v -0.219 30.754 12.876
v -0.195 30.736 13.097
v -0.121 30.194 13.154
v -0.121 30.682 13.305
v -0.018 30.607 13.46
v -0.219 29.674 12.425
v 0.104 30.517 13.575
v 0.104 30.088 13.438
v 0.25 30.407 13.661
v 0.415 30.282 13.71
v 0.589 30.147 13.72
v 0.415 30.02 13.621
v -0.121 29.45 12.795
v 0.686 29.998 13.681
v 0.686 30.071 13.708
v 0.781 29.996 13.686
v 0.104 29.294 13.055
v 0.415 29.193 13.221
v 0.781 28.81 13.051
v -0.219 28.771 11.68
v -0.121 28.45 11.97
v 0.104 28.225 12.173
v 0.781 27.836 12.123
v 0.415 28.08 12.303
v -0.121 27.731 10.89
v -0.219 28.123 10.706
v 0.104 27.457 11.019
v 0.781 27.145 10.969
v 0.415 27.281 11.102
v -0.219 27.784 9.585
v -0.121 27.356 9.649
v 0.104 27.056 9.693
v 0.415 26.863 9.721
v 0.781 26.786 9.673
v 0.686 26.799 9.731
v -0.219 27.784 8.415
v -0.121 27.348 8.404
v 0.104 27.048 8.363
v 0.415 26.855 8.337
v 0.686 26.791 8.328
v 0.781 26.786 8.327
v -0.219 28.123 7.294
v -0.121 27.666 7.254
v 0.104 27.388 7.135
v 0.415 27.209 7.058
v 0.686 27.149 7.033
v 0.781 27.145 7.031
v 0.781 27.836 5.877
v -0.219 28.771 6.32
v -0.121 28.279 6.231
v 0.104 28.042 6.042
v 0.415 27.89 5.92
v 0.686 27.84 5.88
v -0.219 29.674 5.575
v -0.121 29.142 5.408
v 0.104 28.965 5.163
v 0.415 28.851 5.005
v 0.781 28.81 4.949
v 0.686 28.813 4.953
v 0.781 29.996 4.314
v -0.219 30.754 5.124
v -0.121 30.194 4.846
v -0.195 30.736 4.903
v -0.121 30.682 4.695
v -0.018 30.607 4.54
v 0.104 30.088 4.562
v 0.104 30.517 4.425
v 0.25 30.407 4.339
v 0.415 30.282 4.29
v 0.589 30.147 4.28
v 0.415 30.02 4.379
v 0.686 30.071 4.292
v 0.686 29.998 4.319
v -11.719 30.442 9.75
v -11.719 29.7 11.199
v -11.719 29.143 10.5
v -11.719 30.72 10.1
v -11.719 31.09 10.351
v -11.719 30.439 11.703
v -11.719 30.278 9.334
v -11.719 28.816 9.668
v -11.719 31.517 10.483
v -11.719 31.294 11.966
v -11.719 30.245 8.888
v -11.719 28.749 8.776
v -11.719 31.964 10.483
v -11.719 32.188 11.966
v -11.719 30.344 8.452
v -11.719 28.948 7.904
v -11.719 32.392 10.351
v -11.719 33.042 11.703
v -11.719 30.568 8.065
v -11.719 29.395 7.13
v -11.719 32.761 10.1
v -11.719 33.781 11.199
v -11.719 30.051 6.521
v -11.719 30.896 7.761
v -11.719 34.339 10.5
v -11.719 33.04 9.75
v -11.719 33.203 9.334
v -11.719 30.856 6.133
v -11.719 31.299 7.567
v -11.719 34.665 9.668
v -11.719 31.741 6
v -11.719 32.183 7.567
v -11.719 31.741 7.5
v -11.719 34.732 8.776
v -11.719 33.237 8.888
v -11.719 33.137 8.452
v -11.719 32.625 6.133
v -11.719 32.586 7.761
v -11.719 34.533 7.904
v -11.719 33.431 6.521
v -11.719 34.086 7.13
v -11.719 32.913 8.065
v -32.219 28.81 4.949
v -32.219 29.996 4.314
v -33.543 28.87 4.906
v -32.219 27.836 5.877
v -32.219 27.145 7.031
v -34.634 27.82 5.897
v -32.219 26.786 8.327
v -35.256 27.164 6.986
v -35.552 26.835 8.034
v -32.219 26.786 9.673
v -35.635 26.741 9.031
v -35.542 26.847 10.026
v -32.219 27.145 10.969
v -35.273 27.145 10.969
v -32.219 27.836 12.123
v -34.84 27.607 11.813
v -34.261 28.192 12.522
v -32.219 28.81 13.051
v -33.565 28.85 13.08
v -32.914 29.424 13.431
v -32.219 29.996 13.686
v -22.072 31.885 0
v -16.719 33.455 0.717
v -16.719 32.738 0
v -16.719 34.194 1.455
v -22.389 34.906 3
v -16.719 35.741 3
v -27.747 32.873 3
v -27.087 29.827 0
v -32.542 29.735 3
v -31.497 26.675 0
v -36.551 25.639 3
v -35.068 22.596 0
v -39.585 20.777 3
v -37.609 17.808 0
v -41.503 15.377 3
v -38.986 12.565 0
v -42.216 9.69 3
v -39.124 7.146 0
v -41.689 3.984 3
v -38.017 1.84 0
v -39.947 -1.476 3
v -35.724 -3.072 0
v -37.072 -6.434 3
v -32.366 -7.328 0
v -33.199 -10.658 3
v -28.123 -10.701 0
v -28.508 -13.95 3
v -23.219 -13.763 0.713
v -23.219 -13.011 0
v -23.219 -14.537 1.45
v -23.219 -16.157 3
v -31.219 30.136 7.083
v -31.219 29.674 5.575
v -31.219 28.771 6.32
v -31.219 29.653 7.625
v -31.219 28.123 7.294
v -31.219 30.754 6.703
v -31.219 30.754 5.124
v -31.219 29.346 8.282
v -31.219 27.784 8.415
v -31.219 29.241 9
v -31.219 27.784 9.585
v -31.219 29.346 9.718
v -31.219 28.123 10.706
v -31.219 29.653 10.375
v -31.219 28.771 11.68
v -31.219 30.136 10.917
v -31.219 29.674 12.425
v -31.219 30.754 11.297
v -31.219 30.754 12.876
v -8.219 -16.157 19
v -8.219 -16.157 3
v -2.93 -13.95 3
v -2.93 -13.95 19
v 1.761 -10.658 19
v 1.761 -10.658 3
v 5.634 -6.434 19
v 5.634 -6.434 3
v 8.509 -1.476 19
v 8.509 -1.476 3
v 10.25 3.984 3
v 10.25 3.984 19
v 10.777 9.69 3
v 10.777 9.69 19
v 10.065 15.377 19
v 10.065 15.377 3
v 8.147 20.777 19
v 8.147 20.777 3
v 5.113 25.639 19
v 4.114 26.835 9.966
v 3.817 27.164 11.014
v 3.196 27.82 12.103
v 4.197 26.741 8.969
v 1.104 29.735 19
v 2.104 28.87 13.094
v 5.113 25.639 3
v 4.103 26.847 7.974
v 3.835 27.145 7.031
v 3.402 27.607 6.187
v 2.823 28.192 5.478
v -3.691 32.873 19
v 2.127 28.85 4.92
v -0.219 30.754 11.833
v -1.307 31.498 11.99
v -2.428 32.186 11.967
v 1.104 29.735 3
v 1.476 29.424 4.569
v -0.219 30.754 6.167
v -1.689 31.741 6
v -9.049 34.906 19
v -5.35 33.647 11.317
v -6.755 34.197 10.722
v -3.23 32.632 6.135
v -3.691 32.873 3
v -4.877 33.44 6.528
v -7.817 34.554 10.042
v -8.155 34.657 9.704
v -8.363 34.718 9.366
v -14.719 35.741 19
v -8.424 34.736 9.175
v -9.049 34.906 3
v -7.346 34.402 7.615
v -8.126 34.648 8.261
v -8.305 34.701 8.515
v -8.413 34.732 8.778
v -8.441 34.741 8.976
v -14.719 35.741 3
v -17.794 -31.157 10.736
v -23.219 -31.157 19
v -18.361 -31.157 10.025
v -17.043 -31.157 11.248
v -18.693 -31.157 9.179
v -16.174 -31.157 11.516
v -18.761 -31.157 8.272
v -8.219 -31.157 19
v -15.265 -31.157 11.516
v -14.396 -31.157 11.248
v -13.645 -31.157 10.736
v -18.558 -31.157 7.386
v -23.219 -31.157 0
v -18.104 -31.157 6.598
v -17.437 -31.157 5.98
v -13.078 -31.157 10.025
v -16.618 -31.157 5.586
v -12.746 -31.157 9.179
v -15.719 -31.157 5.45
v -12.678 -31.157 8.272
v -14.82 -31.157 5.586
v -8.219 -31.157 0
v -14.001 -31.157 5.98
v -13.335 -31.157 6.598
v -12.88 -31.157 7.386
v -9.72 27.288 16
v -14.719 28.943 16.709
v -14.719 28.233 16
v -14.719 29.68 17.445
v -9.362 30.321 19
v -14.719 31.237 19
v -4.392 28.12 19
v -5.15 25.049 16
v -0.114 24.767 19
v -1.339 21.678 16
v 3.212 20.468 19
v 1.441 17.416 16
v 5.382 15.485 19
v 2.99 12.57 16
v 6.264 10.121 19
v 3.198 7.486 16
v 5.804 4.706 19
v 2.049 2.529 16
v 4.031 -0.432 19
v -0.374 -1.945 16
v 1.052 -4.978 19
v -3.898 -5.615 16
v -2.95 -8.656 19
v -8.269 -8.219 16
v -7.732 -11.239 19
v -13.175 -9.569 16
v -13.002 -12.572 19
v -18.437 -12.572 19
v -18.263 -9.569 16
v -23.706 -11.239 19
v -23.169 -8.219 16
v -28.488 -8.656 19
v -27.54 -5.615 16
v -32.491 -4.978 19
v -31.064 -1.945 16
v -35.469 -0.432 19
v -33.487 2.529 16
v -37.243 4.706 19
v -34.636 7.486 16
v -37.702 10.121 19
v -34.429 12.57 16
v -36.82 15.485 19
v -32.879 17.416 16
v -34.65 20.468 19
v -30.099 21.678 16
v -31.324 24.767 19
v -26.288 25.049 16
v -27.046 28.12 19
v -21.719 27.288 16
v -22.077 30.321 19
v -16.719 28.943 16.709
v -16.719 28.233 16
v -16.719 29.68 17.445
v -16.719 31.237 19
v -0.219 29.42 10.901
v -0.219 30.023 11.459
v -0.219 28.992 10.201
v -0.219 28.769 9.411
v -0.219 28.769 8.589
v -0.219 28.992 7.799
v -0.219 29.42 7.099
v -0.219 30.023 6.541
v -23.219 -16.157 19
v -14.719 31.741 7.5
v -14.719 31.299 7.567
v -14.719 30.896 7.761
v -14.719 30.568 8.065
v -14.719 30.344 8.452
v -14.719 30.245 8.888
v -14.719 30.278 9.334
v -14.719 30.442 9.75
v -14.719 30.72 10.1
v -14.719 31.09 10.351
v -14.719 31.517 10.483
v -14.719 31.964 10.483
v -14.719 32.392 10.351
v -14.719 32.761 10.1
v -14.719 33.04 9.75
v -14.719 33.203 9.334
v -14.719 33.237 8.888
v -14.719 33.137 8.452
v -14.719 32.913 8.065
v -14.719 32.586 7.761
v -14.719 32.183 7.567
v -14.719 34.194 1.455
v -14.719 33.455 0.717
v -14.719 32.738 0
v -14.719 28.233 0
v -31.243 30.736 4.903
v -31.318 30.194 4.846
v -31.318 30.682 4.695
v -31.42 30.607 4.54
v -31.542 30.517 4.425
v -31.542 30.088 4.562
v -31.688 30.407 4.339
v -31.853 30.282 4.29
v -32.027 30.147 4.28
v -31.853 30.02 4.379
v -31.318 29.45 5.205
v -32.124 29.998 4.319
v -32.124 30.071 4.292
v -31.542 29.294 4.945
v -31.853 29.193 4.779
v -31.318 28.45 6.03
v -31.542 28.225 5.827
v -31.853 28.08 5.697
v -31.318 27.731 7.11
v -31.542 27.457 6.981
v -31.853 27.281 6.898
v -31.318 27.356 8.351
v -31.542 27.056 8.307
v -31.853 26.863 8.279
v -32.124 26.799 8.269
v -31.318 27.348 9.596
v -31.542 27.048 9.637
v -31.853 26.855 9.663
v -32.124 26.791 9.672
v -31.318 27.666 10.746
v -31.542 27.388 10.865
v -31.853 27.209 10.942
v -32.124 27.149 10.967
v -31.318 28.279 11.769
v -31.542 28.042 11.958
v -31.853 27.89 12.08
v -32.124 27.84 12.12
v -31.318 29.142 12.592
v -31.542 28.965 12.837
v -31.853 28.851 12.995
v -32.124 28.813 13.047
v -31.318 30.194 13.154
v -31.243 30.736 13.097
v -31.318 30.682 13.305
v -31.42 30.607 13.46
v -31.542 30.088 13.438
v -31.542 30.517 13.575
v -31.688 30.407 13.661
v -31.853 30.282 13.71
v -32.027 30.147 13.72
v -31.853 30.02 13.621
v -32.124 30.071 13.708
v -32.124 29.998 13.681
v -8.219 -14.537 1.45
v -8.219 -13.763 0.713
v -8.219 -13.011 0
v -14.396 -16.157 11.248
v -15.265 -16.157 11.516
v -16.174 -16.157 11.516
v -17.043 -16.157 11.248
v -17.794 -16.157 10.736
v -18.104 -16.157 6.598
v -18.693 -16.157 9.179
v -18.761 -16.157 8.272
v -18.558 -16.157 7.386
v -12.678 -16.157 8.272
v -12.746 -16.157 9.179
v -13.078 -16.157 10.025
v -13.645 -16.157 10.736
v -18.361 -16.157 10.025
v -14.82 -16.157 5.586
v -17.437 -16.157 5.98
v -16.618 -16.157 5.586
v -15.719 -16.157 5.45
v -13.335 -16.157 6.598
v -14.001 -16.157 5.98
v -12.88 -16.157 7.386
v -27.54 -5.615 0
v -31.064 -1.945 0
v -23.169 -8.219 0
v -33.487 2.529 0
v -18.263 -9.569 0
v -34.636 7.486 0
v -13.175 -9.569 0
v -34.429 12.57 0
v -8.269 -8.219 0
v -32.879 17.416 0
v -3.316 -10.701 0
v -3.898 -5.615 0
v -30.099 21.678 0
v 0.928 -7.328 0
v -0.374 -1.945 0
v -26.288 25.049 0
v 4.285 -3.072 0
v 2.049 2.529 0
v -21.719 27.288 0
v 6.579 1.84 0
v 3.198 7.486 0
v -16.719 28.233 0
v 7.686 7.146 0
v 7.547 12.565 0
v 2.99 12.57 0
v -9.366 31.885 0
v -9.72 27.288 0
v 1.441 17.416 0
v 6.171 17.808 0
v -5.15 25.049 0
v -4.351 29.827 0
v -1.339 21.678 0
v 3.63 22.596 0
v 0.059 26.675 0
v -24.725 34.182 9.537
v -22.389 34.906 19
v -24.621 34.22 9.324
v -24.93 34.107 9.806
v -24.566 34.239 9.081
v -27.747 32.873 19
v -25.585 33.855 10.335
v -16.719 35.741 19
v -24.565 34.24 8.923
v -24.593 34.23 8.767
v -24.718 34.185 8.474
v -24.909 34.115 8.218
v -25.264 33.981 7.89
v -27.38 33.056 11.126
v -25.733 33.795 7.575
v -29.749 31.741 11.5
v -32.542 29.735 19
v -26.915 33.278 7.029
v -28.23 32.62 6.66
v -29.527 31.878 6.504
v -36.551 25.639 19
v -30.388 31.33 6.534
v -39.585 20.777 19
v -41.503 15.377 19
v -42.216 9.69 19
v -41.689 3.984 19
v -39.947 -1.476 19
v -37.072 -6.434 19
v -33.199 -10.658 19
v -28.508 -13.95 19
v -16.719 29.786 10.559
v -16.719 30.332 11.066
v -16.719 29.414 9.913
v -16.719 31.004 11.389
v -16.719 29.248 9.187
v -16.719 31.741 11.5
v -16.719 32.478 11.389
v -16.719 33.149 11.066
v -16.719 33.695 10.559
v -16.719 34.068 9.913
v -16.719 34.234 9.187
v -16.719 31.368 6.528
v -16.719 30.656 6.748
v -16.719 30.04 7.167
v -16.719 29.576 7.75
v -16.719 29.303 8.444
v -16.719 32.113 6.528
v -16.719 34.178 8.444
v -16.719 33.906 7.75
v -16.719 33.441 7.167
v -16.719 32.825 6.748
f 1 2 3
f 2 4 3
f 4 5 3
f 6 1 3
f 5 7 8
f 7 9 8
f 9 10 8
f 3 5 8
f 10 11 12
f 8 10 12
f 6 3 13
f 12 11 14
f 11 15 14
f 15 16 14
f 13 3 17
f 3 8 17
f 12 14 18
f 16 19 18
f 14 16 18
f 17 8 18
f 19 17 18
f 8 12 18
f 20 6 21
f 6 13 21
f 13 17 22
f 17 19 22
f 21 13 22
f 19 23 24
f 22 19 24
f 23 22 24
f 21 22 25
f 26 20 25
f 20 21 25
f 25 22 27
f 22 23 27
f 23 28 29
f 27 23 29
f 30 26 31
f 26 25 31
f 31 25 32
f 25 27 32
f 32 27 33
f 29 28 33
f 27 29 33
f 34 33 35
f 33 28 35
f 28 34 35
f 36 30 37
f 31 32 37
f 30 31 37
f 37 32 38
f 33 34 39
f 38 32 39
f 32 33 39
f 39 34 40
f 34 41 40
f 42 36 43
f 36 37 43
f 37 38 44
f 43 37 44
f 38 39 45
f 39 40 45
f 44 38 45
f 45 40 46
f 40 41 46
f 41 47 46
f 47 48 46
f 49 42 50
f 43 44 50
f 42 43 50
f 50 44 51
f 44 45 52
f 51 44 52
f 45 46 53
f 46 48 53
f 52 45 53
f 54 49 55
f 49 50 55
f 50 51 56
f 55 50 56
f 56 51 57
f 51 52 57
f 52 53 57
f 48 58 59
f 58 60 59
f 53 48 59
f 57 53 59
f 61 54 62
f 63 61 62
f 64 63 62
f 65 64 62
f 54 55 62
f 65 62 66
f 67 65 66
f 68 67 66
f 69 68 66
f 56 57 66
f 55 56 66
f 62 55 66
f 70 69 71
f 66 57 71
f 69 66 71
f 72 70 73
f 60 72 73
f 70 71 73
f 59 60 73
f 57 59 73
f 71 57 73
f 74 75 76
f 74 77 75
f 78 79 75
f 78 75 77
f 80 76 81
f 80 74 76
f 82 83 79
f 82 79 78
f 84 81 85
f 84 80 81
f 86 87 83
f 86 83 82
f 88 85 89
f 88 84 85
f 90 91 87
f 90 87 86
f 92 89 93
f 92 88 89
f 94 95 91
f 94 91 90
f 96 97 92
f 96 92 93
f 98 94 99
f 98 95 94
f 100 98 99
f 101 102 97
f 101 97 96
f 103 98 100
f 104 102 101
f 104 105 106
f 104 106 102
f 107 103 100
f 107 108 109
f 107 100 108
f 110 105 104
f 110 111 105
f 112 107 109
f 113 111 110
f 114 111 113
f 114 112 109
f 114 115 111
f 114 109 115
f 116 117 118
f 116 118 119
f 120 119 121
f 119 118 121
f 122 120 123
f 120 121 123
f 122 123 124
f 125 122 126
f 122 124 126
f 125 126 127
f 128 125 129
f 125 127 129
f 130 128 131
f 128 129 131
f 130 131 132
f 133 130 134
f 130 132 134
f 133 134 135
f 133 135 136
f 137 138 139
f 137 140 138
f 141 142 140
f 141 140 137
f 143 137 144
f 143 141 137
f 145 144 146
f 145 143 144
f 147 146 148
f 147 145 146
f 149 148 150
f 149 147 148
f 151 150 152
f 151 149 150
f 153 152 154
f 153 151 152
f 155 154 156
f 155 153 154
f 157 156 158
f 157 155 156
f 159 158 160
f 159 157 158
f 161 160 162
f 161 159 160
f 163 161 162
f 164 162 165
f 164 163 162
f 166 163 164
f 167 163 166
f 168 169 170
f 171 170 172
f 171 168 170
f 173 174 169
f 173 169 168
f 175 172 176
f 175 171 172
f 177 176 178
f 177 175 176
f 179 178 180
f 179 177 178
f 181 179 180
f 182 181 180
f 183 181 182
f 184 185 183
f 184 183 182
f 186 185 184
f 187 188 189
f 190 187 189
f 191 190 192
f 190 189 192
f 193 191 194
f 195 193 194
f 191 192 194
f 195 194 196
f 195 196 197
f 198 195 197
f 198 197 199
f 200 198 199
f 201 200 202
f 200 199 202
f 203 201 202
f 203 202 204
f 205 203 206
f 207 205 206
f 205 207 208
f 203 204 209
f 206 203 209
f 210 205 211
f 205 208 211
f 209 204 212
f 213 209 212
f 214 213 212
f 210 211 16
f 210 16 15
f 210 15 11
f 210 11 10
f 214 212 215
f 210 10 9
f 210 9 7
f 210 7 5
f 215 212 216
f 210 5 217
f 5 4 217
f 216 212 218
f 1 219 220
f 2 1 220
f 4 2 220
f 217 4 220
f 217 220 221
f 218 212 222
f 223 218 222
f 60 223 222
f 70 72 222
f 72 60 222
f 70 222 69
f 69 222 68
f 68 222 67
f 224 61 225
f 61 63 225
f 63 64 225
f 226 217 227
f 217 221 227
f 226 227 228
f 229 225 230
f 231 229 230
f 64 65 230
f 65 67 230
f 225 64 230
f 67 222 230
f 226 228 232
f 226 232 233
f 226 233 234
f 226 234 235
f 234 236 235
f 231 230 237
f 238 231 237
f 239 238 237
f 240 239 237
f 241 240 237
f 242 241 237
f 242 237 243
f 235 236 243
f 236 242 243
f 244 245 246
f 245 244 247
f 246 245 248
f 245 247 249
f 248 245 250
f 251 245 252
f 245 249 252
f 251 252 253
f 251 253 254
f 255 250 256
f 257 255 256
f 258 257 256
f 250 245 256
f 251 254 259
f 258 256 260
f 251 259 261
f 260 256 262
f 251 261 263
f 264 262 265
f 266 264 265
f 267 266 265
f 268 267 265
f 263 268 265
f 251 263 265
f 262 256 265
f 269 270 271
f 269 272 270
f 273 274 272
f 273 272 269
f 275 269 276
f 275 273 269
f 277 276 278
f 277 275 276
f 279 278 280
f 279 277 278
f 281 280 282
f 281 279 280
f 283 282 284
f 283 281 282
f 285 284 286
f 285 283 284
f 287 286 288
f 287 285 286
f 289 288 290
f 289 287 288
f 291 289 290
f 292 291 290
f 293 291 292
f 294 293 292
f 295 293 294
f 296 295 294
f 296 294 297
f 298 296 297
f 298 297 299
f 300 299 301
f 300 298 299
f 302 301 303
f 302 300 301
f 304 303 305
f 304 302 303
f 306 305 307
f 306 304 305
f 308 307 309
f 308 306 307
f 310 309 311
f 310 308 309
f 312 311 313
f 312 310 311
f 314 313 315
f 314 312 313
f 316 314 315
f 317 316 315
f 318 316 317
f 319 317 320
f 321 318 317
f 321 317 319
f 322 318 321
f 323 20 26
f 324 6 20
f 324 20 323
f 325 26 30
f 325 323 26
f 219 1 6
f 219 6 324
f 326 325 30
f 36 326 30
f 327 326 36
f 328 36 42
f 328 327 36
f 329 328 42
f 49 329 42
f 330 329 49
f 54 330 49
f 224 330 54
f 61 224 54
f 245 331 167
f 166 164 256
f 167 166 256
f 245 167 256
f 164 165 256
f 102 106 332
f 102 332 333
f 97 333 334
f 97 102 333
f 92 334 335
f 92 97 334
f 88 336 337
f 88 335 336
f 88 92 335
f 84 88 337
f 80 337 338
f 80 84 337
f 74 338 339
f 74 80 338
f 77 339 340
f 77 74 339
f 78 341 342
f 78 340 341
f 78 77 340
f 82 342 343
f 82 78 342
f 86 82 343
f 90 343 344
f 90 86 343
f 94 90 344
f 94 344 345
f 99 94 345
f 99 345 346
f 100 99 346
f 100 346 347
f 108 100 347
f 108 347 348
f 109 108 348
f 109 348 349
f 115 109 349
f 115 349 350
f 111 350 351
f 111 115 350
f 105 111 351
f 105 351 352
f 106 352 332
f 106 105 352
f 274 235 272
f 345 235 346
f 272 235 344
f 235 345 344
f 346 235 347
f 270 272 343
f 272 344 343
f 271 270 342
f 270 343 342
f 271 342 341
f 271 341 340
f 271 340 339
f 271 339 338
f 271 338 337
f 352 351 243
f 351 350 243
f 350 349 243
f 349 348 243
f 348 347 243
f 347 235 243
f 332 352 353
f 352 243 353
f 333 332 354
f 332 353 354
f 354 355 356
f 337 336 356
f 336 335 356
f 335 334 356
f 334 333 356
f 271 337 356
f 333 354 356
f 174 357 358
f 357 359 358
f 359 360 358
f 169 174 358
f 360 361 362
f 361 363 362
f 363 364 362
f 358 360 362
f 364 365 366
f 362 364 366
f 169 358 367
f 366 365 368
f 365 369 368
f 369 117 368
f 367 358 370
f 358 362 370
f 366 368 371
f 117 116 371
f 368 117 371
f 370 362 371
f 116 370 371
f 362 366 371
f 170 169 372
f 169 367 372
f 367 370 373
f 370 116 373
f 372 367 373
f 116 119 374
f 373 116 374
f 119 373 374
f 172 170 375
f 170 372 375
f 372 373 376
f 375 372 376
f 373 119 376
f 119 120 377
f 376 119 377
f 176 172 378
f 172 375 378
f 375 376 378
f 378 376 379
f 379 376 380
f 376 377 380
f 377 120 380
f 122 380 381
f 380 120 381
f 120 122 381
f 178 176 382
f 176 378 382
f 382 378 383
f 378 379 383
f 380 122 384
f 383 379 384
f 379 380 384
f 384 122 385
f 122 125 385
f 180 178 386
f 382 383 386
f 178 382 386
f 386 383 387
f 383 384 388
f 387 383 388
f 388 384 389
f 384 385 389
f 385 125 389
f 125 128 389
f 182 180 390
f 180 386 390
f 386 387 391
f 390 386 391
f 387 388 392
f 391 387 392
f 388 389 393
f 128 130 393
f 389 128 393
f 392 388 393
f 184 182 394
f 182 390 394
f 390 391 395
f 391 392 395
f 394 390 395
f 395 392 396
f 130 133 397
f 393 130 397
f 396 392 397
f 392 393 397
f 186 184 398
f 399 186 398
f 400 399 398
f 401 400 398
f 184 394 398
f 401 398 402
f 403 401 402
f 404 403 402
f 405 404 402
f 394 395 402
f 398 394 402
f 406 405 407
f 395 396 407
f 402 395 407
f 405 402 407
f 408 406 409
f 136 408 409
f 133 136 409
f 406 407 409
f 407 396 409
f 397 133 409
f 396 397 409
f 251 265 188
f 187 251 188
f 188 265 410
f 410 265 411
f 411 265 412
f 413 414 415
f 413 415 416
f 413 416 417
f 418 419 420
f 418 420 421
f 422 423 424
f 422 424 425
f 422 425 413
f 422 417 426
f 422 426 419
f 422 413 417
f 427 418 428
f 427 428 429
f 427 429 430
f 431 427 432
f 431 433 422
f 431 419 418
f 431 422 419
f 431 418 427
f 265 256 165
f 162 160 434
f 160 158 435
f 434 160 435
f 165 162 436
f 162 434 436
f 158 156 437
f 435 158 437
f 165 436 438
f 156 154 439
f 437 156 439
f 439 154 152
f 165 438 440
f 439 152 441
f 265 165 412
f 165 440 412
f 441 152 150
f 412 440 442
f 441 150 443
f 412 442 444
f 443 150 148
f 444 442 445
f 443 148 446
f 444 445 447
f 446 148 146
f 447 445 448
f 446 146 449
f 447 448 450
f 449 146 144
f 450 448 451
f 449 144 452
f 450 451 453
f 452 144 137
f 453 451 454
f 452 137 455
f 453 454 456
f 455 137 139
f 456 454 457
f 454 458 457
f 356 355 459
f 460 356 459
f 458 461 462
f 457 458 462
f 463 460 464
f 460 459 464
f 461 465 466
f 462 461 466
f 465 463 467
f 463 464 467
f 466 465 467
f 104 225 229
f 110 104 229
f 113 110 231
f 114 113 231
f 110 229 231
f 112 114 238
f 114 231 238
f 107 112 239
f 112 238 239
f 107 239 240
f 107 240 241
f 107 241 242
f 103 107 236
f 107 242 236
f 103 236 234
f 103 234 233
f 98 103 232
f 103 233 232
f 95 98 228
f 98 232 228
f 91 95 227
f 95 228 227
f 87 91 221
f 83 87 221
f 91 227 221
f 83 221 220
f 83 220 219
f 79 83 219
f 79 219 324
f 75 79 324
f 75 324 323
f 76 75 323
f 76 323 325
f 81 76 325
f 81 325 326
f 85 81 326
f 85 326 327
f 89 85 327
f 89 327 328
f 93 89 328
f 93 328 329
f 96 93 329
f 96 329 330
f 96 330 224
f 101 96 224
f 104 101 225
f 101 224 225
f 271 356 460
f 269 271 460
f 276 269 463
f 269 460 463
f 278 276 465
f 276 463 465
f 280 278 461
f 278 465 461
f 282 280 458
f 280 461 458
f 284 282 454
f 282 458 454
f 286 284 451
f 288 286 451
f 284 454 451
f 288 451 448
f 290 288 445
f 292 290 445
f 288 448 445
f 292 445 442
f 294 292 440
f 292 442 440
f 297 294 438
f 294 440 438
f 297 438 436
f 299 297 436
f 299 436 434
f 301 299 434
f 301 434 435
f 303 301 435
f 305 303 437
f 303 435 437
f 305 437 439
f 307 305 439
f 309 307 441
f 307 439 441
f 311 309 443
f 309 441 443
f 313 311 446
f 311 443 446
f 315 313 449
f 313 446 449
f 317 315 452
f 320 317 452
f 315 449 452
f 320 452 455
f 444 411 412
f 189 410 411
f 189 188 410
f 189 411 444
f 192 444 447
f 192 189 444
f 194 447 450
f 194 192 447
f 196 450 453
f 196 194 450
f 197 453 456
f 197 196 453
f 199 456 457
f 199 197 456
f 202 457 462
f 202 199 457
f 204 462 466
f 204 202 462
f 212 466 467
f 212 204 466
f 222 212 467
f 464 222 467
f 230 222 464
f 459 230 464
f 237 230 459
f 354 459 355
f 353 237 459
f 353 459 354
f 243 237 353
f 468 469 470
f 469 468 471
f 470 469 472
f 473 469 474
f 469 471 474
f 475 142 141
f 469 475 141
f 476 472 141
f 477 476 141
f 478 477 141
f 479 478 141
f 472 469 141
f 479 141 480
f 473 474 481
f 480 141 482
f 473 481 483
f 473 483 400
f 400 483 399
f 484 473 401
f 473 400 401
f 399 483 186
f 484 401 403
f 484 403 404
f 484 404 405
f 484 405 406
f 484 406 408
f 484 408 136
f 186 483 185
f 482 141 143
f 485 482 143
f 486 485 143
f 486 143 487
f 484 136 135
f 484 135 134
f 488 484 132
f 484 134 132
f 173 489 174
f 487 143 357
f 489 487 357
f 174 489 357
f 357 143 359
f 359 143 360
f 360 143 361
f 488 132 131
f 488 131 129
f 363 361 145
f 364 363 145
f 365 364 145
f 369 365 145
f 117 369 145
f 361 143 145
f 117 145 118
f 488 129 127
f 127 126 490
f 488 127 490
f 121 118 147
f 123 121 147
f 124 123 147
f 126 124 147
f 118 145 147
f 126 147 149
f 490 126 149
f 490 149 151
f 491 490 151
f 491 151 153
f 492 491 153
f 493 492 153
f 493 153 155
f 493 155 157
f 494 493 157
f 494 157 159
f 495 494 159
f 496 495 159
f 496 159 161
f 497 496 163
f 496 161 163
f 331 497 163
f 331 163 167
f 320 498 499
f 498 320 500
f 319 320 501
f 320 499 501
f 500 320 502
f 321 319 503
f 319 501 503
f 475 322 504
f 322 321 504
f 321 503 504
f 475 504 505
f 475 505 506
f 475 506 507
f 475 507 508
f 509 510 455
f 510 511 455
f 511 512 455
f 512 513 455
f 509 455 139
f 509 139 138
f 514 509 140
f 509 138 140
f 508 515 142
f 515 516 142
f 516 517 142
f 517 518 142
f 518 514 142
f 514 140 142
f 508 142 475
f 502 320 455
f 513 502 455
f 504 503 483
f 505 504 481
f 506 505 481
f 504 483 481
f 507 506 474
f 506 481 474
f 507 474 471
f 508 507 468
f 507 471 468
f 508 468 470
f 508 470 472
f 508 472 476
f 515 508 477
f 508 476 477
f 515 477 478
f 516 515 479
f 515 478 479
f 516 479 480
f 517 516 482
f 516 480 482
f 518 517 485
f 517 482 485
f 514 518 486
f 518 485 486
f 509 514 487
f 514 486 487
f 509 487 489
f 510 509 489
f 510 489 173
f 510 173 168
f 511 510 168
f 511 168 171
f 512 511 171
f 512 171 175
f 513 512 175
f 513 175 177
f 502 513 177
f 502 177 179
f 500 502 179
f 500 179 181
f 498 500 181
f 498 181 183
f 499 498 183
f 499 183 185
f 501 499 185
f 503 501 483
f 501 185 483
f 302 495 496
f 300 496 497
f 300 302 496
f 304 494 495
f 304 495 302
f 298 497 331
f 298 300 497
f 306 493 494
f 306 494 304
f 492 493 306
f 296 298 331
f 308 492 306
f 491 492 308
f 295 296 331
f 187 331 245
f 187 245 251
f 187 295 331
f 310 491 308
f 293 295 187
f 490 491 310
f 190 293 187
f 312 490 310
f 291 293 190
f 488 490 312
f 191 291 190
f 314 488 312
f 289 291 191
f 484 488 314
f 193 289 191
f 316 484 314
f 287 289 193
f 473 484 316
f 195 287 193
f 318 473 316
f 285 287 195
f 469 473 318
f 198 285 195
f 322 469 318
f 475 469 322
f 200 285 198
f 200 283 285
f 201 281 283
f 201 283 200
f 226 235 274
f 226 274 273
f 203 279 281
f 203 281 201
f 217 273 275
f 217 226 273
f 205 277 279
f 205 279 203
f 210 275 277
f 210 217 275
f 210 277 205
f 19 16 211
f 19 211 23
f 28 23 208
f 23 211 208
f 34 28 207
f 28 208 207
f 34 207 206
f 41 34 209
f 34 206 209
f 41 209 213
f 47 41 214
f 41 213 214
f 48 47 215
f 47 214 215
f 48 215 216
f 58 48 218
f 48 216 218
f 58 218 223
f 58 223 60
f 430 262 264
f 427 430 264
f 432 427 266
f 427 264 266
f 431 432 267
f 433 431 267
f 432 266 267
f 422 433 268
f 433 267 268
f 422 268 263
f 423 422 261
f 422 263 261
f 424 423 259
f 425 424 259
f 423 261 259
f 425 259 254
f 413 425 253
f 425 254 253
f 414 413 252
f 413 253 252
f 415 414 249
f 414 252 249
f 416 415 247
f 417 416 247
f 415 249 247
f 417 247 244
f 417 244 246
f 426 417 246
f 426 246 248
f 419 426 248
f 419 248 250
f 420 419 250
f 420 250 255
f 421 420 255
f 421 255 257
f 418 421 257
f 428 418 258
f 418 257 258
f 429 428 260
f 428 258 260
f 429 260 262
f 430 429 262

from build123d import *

# Parameters (mm, degrees)
BOSS_EXTRUDE1_DEPTH     = 16
SKETCH2_R               = 3.05
CUT_EXTRUDE1_DEPTH      = 15
BOSS_EXTRUDE2_DEPTH     = 3
CHAMFER4_SIZE           = 3
CUT_EXTRUDE2_DEPTH      = 29
CUT_EXTRUDE2_DEPTH_BACK = 25
SKETCH4_R               = 1.5
SKETCH5_R               = 2.5
CUT_EXTRUDE3_DEPTH      = 27.5
SKETCH6_R               = 3
CUT_EXTRUDE4_DEPTH      = 22.5
SKETCH5_3_R             = 5
SKETCH5_3_R_2           = 2.5
CUT_EXTRUDE5_DEPTH      = 11
SKETCH6_3_R             = 5
SKETCH6_3_R_2           = 3
CUT_EXTRUDE6_DEPTH      = 11
FILLET1_R               = 1


with BuildPart() as part:
    # Sketch1 → Boss-Extrude1 (new body)
    with BuildSketch(Plane.XY):
        with BuildLine():
            ThreePointArc((-14.719179189, 28.233250262), (-15.719179189, -9.740415699), (-16.719179189, 28.233250262))
            Line((-16.719179189, 28.233250262), (-16.719179189, 35.740709655))
            ThreePointArc((-16.719179189, 35.740709655), (-42.013744392, 12.552886715), (-23.219179189, -16.156945753))
            Line((-23.219179189, -16.156945753), (-23.219179189, -31.156945753))
            Line((-23.219179189, -31.156945753), (-8.219179189, -31.156945753))
            Line((-8.219179189, -31.156945753), (-8.219179189, -16.156945753))
            ThreePointArc((-8.219179189, -16.156945753), (10.575386014, 12.552886715), (-14.719179189, 35.740709655))
            Line((-14.719179189, 35.740709655), (-14.719179189, 28.233250262))
        make_face()
    extrude(amount=BOSS_EXTRUDE1_DEPTH)

    # Sketch2 → Cut-Extrude1 (cut)
    with BuildSketch(Plane.XZ.offset(31.156945753)):
        with Locations(Location((-15.719179189, 8.5, 0), (0, 0, 270))):
            Circle(SKETCH2_R)
    extrude(amount=-CUT_EXTRUDE1_DEPTH, mode=Mode.SUBTRACT)

    # Sketch3 → Boss-Extrude2 (add)
    with BuildSketch(Plane.XY.offset(16)):
        with BuildLine():
            ThreePointArc((-14.719179189, 28.233250262), (-15.719179189, -9.740415699), (-16.719179189, 28.233250262))
            Line((-16.719179189, 28.233250262), (-16.719179189, 35.740709655))
            ThreePointArc((-16.719179189, 35.740709655), (-42.013744392, 12.552886715), (-23.219179189, -16.156945753))
            Line((-23.219179189, -16.156945753), (-23.219179189, -31.156945753))
            Line((-23.219179189, -31.156945753), (-8.219179189, -31.156945753))
            Line((-8.219179189, -31.156945753), (-8.219179189, -16.156945753))
            ThreePointArc((-8.219179189, -16.156945753), (10.575386014, 12.552886715), (-14.719179189, 35.740709655))
            Line((-14.719179189, 35.740709655), (-14.719179189, 28.233250262))
        make_face()
    extrude(amount=BOSS_EXTRUDE2_DEPTH)

    # Chamfer4
    chamfer4_edges = [part.edges().sort_by_distance(p)[0] for p in [
        (-15.719179189, -9.740415699, 19),
        (10.575386014, 12.552886715, 0),
        (-42.013744392, 12.552886715, 0),
    ]]
    chamfer(chamfer4_edges, length=CHAMFER4_SIZE)

    # Sketch4 → Cut-Extrude2 (cut, two sides: drawn at the far end of the back side and taken through both)
    with BuildSketch(Plane.ZY.offset(14.719179189).offset(-CUT_EXTRUDE2_DEPTH_BACK)):
        with Locations(Location((9, 31.740709655, 0), (0, 0, 180))):
            Circle(SKETCH4_R)
    extrude(amount=CUT_EXTRUDE2_DEPTH + CUT_EXTRUDE2_DEPTH_BACK, mode=Mode.SUBTRACT)

    # Sketch5 → Cut-Extrude3 (cut)
    with BuildSketch(Plane.ZY.offset(42.219179189)):
        with Locations((9, 31.740709655)):
            Circle(SKETCH5_R)
    extrude(amount=-CUT_EXTRUDE3_DEPTH, mode=Mode.SUBTRACT)

    # Sketch6 → Cut-Extrude4 (cut)
    with BuildSketch(Plane(origin=(10.780820811, 0, 0), x_dir=(0, 0, -1), z_dir=(1, 0, 0))):
        with Locations((-9, 31.740709655)):
            Circle(SKETCH6_R)
    extrude(amount=-CUT_EXTRUDE4_DEPTH, mode=Mode.SUBTRACT)

    # Sketch5<3> → Cut-Extrude5 (cut)
    with BuildSketch(Plane.ZY.offset(42.219179189)):
        with Locations((9, 31.740709655)):
            Circle(SKETCH5_3_R)
        with Locations(Location((9, 31.740709655, 0), (0, 0, 336.747995985))):
            Circle(SKETCH5_3_R_2, mode=Mode.SUBTRACT)
    extrude(amount=-CUT_EXTRUDE5_DEPTH, mode=Mode.SUBTRACT)

    # Sketch6<3> → Cut-Extrude6 (cut)
    with BuildSketch(Plane(origin=(10.780820811, 0, 0), x_dir=(0, 0, -1), z_dir=(1, 0, 0))):
        with Locations((-9, 31.740709655)):
            Circle(SKETCH6_3_R)
        with Locations(Location((-9, 31.740709655, 0), (0, 0, 340.793122324))):
            Circle(SKETCH6_3_R_2, mode=Mode.SUBTRACT)
    extrude(amount=-CUT_EXTRUDE6_DEPTH, mode=Mode.SUBTRACT)

    # Fillet1
    fillet1_edges = [part.edges().sort_by_distance(p)[0] for p in [
        (-31.219179189, 26.740709655, 9),
        (-0.219179189, 26.740709655, 9),
    ]]
    fillet(fillet1_edges, radius=FILLET1_R)


solid = part.part
